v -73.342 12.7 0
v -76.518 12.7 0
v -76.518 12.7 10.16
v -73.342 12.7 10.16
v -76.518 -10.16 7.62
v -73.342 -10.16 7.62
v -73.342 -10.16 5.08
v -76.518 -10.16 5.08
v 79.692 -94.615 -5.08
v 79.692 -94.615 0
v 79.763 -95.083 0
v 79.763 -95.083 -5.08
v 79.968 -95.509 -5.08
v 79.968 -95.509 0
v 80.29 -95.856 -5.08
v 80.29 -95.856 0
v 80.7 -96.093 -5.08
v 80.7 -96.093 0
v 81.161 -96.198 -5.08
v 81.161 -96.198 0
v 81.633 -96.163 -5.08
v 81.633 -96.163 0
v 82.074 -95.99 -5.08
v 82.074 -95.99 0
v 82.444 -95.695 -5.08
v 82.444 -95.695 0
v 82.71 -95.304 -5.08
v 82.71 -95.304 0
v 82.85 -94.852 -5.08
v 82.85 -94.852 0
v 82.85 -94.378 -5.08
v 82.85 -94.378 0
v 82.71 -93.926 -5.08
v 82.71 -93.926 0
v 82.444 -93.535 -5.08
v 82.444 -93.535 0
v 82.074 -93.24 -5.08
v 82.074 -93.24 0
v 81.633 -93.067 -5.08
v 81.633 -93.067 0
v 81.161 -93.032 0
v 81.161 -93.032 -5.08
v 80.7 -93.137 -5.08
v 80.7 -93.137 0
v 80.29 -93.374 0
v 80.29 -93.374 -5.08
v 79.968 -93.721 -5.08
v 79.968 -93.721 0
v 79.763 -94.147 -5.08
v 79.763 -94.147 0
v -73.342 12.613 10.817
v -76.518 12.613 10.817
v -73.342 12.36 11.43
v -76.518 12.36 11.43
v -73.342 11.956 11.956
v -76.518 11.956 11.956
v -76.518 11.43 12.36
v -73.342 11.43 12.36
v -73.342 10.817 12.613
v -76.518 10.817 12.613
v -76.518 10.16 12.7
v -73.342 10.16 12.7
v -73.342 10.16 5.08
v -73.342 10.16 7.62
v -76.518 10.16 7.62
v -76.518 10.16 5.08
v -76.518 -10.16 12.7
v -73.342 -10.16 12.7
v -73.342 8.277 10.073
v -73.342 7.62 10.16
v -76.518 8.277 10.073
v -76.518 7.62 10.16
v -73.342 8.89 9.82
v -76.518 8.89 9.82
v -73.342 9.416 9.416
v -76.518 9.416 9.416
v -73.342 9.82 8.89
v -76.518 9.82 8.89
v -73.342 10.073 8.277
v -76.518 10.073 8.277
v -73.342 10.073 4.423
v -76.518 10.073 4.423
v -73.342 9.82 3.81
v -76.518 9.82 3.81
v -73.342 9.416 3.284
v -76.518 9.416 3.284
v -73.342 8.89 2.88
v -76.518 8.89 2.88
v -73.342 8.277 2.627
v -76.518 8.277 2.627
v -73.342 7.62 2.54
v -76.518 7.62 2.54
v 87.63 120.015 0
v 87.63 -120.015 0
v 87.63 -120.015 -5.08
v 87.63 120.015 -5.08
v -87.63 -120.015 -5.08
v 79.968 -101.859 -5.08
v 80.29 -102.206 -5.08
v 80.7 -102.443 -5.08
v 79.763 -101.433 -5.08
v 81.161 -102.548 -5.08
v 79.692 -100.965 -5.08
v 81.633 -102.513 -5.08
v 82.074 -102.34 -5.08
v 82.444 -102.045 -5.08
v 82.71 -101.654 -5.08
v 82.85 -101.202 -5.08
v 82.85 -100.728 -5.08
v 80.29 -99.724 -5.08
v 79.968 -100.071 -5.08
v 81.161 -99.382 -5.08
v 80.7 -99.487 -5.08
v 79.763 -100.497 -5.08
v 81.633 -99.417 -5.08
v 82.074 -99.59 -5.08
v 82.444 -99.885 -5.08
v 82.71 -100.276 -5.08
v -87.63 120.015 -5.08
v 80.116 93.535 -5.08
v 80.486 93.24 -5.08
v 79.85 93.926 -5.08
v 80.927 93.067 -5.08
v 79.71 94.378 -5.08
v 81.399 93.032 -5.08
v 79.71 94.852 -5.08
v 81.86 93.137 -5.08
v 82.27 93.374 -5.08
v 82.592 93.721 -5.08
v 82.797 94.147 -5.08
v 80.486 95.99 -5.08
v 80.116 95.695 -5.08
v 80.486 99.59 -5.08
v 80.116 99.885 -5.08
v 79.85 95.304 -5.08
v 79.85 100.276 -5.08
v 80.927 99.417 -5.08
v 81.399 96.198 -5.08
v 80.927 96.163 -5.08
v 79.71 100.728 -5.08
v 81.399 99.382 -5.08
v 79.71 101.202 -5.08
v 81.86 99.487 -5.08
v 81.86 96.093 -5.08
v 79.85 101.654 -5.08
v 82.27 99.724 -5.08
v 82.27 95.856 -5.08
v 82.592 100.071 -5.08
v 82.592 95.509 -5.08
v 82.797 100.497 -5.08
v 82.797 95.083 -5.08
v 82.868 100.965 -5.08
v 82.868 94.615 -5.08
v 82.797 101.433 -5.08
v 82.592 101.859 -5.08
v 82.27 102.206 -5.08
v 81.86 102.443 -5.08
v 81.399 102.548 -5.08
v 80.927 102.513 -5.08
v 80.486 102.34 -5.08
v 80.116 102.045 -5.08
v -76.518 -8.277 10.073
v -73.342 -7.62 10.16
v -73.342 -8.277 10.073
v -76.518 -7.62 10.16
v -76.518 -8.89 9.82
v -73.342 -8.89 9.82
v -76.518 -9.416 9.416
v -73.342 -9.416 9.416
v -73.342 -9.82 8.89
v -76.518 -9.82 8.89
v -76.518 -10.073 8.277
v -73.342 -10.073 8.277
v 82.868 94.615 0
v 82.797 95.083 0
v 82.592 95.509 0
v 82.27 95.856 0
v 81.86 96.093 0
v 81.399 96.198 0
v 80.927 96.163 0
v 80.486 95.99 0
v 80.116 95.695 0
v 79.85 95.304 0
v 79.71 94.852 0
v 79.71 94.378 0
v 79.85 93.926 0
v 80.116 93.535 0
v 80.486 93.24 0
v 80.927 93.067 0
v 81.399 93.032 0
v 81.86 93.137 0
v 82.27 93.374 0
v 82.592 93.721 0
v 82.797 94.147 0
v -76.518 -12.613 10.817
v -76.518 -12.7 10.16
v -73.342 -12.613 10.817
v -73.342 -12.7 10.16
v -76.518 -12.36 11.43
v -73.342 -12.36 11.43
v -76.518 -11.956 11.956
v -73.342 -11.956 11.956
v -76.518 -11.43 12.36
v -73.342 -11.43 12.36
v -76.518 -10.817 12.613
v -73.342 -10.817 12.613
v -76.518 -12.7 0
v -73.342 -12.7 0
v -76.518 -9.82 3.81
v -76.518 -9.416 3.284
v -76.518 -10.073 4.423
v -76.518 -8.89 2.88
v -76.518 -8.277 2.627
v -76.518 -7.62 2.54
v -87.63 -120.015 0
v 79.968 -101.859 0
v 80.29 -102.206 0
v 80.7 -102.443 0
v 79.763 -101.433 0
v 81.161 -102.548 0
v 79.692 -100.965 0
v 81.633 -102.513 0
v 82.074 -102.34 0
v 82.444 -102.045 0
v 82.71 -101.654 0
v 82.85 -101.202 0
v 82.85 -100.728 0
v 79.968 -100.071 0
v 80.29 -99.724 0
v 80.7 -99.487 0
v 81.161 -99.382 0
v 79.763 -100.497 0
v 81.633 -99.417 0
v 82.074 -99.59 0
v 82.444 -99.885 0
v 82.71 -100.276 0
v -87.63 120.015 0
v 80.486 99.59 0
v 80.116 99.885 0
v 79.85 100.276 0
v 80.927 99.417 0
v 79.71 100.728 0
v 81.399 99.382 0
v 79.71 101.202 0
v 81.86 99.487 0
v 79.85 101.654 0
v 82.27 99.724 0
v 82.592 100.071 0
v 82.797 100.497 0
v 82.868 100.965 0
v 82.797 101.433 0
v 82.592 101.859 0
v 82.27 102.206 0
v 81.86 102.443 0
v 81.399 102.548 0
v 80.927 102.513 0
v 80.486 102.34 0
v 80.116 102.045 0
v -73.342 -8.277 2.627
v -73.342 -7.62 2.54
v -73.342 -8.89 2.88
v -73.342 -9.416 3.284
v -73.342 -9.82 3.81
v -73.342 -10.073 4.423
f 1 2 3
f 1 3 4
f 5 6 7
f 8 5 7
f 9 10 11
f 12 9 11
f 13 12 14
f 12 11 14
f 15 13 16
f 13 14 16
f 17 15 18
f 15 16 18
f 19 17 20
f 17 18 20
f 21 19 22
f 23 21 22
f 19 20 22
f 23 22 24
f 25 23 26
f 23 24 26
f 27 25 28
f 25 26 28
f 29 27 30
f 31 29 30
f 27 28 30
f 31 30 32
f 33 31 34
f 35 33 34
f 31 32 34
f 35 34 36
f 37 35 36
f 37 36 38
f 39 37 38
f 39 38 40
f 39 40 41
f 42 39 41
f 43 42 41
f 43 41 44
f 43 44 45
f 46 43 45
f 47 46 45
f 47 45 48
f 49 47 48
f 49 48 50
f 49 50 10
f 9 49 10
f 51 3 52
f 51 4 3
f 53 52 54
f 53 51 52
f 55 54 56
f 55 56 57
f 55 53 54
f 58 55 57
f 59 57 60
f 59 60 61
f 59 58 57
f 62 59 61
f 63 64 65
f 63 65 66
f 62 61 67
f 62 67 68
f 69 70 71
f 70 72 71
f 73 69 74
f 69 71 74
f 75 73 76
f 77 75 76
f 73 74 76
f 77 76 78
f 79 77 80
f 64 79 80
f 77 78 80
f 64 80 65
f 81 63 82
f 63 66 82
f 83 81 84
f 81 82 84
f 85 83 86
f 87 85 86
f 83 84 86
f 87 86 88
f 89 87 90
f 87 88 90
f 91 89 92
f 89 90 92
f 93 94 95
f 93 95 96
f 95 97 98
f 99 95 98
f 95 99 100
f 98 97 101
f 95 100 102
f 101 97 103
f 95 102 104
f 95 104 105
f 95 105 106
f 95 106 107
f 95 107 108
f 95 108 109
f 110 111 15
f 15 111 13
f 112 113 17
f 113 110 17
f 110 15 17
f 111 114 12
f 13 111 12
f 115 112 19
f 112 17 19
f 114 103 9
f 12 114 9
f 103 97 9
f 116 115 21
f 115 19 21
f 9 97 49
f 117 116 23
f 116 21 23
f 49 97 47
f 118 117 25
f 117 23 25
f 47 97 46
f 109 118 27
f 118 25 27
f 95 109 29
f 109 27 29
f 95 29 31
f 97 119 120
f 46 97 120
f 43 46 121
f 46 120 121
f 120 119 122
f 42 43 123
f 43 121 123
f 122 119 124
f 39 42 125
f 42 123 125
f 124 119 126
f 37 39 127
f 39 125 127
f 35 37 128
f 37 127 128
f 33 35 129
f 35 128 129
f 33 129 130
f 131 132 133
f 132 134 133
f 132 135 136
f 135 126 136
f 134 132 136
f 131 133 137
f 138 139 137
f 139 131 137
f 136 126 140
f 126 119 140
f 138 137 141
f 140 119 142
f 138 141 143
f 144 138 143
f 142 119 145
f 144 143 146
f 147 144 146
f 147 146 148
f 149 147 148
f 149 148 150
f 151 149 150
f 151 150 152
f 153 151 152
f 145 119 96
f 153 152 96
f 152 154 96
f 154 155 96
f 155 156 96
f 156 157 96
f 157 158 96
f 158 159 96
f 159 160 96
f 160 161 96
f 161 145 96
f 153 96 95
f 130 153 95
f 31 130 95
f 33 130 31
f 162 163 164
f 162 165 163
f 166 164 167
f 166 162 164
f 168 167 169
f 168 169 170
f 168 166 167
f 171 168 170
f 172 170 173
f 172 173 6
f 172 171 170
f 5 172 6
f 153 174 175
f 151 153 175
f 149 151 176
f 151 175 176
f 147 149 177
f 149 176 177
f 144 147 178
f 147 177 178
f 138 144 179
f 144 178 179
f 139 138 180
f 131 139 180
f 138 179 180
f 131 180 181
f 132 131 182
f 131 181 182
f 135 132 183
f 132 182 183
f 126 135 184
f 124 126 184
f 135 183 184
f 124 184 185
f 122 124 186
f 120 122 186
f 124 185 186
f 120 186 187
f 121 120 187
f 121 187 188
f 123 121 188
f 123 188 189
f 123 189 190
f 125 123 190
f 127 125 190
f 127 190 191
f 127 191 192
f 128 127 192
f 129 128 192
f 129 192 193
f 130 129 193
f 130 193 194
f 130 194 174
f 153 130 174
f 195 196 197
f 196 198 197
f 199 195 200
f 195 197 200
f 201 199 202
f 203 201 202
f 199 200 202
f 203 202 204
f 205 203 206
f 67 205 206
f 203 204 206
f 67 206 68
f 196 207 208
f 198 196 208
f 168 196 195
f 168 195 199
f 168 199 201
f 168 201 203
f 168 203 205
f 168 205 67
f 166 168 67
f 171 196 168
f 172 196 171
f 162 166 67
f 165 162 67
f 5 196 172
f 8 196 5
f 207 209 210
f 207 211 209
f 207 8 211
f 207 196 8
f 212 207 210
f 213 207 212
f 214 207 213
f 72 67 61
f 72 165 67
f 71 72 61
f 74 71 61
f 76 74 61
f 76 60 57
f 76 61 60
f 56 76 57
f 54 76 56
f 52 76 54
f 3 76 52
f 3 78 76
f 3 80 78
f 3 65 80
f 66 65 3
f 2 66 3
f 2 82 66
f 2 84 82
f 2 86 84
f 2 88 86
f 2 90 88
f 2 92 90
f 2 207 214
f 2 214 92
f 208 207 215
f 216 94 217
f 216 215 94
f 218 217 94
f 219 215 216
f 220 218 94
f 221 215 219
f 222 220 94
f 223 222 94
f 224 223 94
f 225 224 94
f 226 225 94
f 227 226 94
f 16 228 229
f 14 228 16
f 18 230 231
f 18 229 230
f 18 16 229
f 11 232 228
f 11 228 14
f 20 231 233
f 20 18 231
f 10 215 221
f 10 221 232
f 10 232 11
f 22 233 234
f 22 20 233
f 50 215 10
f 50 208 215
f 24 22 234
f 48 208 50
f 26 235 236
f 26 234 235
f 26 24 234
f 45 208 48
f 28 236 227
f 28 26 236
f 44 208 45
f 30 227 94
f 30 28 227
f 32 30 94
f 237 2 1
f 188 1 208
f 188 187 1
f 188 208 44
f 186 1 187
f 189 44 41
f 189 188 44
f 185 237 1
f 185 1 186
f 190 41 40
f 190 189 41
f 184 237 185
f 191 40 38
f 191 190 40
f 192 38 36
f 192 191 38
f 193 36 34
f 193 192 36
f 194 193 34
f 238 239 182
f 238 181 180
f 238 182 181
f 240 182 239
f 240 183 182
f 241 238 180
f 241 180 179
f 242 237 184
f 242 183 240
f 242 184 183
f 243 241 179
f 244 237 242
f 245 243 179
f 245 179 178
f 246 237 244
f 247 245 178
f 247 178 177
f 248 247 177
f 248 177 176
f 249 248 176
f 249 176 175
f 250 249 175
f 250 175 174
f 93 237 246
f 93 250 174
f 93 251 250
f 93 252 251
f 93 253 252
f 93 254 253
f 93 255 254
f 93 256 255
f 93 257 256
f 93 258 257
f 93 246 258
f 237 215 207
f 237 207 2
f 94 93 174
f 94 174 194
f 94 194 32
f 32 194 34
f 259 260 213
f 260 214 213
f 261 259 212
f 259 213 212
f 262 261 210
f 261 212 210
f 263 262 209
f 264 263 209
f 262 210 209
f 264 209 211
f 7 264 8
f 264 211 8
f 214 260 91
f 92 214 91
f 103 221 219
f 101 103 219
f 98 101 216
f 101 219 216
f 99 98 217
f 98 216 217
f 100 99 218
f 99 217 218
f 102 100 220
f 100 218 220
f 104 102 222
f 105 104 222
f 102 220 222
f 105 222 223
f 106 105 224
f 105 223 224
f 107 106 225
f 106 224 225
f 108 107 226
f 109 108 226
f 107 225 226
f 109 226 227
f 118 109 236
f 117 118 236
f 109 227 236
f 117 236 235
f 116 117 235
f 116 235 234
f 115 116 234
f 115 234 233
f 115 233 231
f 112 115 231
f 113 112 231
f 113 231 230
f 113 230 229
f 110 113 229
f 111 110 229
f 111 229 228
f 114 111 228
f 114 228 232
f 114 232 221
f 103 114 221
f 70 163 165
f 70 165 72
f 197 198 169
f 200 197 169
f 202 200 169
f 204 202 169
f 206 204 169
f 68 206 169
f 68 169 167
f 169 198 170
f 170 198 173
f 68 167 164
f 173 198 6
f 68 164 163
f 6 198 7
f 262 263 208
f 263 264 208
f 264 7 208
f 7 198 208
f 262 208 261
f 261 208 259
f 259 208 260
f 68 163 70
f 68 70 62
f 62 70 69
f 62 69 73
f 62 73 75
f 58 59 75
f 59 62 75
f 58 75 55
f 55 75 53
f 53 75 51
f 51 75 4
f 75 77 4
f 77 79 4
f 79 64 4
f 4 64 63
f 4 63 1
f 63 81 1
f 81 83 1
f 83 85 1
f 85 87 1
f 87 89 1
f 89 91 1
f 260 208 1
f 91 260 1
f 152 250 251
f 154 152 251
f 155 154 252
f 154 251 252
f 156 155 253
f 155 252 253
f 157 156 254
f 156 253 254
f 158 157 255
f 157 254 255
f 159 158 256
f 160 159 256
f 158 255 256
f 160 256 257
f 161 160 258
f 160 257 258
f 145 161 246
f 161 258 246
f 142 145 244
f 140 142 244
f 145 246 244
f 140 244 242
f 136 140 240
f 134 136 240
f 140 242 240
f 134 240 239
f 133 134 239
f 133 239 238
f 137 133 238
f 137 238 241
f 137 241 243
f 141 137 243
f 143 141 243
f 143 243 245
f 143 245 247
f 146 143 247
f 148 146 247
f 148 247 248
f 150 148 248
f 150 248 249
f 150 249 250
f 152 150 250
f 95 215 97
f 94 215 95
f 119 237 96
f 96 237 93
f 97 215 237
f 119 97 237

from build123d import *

# Parameters (mm, degrees)
SKETCH1_W           = 175.26
SKETCH1_H           = 240.03
BOSS_EXTRUDE1_DEPTH = 5.08
SKETCH2_R           = 1.5875
CUT_EXTRUDE1_DEPTH  = 149.689016155
SKETCH3_W           = 3.175
SKETCH3_H           = 25.4
BOSS_EXTRUDE2_DEPTH = 12.7
SKETCH4_W           = 7.62
SKETCH4_H           = 20.32
CUT_EXTRUDE2_DEPTH  = 202.189055322
FILLET1_R           = 2.54


with BuildPart() as part:
    # Sketch1 → Boss-Extrude1 (new body)
    with BuildSketch(Plane.XY):
        Rectangle(SKETCH1_W, SKETCH1_H)
    extrude(amount=-BOSS_EXTRUDE1_DEPTH)

    # Sketch2 → Cut-Extrude1 (cut, through all)
    with BuildSketch(Plane.XY):
        with Locations((81.28, 100.965)):
            Circle(SKETCH2_R)
        with Locations((81.28, 94.615)):
            Circle(SKETCH2_R)
        with Locations(Location((81.28, -94.615, 0), (0, 0, 180))):
            Circle(SKETCH2_R)
        with Locations(Location((81.28, -100.965, 0), (0, 0, 180))):
            Circle(SKETCH2_R)
    extrude(amount=-CUT_EXTRUDE1_DEPTH, mode=Mode.SUBTRACT)

    # Sketch3 → Boss-Extrude2 (add)
    with BuildSketch(Plane.XY):
        with Locations((-74.93, 0)):
            Rectangle(SKETCH3_W, SKETCH3_H)
    extrude(amount=BOSS_EXTRUDE2_DEPTH)

    # Sketch4 → Cut-Extrude2 (cut, through all)
    with BuildSketch(Plane(origin=(-73.3425, 0, 0), x_dir=(0, 0, -1), z_dir=(1, 0, 0))):
        with Locations((-6.35, 0)):
            Rectangle(SKETCH4_W, SKETCH4_H)
    extrude(amount=-CUT_EXTRUDE2_DEPTH, mode=Mode.SUBTRACT)

    # Fillet1
    fillet1_edges = [part.edges().sort_by_distance(p)[0] for p in [
        (-74.93, 12.7, 12.7),
        (-74.93, -12.7, 12.7),
        (-74.93, 10.16, 2.54),
        (-74.93, -10.16, 2.54),
        (-74.93, -10.16, 10.16),
        (-74.93, 10.16, 10.16),
    ]]
    fillet(fillet1_edges, radius=FILLET1_R)


solid = part.part
